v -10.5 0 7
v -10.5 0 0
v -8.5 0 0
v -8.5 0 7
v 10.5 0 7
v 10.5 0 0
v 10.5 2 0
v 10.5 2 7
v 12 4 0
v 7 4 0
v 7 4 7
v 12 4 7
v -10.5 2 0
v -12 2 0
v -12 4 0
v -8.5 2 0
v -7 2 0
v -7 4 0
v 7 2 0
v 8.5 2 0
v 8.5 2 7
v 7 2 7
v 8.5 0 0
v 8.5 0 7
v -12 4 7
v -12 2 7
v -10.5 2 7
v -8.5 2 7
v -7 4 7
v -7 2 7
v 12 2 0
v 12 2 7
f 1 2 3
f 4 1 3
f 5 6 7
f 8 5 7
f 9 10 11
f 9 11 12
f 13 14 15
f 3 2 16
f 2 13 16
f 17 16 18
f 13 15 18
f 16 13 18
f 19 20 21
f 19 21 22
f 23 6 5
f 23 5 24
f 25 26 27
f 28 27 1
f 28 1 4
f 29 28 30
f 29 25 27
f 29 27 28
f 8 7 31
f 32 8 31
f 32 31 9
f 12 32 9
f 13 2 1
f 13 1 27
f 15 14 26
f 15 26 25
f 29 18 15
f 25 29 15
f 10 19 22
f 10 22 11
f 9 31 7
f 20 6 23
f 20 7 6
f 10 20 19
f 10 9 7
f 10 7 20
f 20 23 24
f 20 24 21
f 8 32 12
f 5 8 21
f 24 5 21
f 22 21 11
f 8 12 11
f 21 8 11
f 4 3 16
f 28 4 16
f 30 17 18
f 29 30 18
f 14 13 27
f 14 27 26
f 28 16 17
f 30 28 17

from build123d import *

# Parameters (mm, degrees)
F2_DEPTH = 7


with BuildPart() as f2:
    # F1 (on Top) → F2 (new body)
    with BuildSketch(Plane.XY):
        Polygon((9.5, 0), (10.5, 0), (10.5, 2), (12, 2), (12, 4), (9.5, 4), align=None)
    extrude(amount=F2_DEPTH)

    # F3: F2 across face


with BuildPart() as f2_1:
    add(f2.part)
    add(f2.part.mirror(Plane(origin=(9.5, 2, 3.5), x_dir=(0, -1, 0), z_dir=(-1, 0, 0))))


with BuildPart() as f4_1:
    # F4: instance of F2
    add(f2_1.part.mirror(Plane.YZ))


solid = Compound([f2_1.part, f4_1.part])
